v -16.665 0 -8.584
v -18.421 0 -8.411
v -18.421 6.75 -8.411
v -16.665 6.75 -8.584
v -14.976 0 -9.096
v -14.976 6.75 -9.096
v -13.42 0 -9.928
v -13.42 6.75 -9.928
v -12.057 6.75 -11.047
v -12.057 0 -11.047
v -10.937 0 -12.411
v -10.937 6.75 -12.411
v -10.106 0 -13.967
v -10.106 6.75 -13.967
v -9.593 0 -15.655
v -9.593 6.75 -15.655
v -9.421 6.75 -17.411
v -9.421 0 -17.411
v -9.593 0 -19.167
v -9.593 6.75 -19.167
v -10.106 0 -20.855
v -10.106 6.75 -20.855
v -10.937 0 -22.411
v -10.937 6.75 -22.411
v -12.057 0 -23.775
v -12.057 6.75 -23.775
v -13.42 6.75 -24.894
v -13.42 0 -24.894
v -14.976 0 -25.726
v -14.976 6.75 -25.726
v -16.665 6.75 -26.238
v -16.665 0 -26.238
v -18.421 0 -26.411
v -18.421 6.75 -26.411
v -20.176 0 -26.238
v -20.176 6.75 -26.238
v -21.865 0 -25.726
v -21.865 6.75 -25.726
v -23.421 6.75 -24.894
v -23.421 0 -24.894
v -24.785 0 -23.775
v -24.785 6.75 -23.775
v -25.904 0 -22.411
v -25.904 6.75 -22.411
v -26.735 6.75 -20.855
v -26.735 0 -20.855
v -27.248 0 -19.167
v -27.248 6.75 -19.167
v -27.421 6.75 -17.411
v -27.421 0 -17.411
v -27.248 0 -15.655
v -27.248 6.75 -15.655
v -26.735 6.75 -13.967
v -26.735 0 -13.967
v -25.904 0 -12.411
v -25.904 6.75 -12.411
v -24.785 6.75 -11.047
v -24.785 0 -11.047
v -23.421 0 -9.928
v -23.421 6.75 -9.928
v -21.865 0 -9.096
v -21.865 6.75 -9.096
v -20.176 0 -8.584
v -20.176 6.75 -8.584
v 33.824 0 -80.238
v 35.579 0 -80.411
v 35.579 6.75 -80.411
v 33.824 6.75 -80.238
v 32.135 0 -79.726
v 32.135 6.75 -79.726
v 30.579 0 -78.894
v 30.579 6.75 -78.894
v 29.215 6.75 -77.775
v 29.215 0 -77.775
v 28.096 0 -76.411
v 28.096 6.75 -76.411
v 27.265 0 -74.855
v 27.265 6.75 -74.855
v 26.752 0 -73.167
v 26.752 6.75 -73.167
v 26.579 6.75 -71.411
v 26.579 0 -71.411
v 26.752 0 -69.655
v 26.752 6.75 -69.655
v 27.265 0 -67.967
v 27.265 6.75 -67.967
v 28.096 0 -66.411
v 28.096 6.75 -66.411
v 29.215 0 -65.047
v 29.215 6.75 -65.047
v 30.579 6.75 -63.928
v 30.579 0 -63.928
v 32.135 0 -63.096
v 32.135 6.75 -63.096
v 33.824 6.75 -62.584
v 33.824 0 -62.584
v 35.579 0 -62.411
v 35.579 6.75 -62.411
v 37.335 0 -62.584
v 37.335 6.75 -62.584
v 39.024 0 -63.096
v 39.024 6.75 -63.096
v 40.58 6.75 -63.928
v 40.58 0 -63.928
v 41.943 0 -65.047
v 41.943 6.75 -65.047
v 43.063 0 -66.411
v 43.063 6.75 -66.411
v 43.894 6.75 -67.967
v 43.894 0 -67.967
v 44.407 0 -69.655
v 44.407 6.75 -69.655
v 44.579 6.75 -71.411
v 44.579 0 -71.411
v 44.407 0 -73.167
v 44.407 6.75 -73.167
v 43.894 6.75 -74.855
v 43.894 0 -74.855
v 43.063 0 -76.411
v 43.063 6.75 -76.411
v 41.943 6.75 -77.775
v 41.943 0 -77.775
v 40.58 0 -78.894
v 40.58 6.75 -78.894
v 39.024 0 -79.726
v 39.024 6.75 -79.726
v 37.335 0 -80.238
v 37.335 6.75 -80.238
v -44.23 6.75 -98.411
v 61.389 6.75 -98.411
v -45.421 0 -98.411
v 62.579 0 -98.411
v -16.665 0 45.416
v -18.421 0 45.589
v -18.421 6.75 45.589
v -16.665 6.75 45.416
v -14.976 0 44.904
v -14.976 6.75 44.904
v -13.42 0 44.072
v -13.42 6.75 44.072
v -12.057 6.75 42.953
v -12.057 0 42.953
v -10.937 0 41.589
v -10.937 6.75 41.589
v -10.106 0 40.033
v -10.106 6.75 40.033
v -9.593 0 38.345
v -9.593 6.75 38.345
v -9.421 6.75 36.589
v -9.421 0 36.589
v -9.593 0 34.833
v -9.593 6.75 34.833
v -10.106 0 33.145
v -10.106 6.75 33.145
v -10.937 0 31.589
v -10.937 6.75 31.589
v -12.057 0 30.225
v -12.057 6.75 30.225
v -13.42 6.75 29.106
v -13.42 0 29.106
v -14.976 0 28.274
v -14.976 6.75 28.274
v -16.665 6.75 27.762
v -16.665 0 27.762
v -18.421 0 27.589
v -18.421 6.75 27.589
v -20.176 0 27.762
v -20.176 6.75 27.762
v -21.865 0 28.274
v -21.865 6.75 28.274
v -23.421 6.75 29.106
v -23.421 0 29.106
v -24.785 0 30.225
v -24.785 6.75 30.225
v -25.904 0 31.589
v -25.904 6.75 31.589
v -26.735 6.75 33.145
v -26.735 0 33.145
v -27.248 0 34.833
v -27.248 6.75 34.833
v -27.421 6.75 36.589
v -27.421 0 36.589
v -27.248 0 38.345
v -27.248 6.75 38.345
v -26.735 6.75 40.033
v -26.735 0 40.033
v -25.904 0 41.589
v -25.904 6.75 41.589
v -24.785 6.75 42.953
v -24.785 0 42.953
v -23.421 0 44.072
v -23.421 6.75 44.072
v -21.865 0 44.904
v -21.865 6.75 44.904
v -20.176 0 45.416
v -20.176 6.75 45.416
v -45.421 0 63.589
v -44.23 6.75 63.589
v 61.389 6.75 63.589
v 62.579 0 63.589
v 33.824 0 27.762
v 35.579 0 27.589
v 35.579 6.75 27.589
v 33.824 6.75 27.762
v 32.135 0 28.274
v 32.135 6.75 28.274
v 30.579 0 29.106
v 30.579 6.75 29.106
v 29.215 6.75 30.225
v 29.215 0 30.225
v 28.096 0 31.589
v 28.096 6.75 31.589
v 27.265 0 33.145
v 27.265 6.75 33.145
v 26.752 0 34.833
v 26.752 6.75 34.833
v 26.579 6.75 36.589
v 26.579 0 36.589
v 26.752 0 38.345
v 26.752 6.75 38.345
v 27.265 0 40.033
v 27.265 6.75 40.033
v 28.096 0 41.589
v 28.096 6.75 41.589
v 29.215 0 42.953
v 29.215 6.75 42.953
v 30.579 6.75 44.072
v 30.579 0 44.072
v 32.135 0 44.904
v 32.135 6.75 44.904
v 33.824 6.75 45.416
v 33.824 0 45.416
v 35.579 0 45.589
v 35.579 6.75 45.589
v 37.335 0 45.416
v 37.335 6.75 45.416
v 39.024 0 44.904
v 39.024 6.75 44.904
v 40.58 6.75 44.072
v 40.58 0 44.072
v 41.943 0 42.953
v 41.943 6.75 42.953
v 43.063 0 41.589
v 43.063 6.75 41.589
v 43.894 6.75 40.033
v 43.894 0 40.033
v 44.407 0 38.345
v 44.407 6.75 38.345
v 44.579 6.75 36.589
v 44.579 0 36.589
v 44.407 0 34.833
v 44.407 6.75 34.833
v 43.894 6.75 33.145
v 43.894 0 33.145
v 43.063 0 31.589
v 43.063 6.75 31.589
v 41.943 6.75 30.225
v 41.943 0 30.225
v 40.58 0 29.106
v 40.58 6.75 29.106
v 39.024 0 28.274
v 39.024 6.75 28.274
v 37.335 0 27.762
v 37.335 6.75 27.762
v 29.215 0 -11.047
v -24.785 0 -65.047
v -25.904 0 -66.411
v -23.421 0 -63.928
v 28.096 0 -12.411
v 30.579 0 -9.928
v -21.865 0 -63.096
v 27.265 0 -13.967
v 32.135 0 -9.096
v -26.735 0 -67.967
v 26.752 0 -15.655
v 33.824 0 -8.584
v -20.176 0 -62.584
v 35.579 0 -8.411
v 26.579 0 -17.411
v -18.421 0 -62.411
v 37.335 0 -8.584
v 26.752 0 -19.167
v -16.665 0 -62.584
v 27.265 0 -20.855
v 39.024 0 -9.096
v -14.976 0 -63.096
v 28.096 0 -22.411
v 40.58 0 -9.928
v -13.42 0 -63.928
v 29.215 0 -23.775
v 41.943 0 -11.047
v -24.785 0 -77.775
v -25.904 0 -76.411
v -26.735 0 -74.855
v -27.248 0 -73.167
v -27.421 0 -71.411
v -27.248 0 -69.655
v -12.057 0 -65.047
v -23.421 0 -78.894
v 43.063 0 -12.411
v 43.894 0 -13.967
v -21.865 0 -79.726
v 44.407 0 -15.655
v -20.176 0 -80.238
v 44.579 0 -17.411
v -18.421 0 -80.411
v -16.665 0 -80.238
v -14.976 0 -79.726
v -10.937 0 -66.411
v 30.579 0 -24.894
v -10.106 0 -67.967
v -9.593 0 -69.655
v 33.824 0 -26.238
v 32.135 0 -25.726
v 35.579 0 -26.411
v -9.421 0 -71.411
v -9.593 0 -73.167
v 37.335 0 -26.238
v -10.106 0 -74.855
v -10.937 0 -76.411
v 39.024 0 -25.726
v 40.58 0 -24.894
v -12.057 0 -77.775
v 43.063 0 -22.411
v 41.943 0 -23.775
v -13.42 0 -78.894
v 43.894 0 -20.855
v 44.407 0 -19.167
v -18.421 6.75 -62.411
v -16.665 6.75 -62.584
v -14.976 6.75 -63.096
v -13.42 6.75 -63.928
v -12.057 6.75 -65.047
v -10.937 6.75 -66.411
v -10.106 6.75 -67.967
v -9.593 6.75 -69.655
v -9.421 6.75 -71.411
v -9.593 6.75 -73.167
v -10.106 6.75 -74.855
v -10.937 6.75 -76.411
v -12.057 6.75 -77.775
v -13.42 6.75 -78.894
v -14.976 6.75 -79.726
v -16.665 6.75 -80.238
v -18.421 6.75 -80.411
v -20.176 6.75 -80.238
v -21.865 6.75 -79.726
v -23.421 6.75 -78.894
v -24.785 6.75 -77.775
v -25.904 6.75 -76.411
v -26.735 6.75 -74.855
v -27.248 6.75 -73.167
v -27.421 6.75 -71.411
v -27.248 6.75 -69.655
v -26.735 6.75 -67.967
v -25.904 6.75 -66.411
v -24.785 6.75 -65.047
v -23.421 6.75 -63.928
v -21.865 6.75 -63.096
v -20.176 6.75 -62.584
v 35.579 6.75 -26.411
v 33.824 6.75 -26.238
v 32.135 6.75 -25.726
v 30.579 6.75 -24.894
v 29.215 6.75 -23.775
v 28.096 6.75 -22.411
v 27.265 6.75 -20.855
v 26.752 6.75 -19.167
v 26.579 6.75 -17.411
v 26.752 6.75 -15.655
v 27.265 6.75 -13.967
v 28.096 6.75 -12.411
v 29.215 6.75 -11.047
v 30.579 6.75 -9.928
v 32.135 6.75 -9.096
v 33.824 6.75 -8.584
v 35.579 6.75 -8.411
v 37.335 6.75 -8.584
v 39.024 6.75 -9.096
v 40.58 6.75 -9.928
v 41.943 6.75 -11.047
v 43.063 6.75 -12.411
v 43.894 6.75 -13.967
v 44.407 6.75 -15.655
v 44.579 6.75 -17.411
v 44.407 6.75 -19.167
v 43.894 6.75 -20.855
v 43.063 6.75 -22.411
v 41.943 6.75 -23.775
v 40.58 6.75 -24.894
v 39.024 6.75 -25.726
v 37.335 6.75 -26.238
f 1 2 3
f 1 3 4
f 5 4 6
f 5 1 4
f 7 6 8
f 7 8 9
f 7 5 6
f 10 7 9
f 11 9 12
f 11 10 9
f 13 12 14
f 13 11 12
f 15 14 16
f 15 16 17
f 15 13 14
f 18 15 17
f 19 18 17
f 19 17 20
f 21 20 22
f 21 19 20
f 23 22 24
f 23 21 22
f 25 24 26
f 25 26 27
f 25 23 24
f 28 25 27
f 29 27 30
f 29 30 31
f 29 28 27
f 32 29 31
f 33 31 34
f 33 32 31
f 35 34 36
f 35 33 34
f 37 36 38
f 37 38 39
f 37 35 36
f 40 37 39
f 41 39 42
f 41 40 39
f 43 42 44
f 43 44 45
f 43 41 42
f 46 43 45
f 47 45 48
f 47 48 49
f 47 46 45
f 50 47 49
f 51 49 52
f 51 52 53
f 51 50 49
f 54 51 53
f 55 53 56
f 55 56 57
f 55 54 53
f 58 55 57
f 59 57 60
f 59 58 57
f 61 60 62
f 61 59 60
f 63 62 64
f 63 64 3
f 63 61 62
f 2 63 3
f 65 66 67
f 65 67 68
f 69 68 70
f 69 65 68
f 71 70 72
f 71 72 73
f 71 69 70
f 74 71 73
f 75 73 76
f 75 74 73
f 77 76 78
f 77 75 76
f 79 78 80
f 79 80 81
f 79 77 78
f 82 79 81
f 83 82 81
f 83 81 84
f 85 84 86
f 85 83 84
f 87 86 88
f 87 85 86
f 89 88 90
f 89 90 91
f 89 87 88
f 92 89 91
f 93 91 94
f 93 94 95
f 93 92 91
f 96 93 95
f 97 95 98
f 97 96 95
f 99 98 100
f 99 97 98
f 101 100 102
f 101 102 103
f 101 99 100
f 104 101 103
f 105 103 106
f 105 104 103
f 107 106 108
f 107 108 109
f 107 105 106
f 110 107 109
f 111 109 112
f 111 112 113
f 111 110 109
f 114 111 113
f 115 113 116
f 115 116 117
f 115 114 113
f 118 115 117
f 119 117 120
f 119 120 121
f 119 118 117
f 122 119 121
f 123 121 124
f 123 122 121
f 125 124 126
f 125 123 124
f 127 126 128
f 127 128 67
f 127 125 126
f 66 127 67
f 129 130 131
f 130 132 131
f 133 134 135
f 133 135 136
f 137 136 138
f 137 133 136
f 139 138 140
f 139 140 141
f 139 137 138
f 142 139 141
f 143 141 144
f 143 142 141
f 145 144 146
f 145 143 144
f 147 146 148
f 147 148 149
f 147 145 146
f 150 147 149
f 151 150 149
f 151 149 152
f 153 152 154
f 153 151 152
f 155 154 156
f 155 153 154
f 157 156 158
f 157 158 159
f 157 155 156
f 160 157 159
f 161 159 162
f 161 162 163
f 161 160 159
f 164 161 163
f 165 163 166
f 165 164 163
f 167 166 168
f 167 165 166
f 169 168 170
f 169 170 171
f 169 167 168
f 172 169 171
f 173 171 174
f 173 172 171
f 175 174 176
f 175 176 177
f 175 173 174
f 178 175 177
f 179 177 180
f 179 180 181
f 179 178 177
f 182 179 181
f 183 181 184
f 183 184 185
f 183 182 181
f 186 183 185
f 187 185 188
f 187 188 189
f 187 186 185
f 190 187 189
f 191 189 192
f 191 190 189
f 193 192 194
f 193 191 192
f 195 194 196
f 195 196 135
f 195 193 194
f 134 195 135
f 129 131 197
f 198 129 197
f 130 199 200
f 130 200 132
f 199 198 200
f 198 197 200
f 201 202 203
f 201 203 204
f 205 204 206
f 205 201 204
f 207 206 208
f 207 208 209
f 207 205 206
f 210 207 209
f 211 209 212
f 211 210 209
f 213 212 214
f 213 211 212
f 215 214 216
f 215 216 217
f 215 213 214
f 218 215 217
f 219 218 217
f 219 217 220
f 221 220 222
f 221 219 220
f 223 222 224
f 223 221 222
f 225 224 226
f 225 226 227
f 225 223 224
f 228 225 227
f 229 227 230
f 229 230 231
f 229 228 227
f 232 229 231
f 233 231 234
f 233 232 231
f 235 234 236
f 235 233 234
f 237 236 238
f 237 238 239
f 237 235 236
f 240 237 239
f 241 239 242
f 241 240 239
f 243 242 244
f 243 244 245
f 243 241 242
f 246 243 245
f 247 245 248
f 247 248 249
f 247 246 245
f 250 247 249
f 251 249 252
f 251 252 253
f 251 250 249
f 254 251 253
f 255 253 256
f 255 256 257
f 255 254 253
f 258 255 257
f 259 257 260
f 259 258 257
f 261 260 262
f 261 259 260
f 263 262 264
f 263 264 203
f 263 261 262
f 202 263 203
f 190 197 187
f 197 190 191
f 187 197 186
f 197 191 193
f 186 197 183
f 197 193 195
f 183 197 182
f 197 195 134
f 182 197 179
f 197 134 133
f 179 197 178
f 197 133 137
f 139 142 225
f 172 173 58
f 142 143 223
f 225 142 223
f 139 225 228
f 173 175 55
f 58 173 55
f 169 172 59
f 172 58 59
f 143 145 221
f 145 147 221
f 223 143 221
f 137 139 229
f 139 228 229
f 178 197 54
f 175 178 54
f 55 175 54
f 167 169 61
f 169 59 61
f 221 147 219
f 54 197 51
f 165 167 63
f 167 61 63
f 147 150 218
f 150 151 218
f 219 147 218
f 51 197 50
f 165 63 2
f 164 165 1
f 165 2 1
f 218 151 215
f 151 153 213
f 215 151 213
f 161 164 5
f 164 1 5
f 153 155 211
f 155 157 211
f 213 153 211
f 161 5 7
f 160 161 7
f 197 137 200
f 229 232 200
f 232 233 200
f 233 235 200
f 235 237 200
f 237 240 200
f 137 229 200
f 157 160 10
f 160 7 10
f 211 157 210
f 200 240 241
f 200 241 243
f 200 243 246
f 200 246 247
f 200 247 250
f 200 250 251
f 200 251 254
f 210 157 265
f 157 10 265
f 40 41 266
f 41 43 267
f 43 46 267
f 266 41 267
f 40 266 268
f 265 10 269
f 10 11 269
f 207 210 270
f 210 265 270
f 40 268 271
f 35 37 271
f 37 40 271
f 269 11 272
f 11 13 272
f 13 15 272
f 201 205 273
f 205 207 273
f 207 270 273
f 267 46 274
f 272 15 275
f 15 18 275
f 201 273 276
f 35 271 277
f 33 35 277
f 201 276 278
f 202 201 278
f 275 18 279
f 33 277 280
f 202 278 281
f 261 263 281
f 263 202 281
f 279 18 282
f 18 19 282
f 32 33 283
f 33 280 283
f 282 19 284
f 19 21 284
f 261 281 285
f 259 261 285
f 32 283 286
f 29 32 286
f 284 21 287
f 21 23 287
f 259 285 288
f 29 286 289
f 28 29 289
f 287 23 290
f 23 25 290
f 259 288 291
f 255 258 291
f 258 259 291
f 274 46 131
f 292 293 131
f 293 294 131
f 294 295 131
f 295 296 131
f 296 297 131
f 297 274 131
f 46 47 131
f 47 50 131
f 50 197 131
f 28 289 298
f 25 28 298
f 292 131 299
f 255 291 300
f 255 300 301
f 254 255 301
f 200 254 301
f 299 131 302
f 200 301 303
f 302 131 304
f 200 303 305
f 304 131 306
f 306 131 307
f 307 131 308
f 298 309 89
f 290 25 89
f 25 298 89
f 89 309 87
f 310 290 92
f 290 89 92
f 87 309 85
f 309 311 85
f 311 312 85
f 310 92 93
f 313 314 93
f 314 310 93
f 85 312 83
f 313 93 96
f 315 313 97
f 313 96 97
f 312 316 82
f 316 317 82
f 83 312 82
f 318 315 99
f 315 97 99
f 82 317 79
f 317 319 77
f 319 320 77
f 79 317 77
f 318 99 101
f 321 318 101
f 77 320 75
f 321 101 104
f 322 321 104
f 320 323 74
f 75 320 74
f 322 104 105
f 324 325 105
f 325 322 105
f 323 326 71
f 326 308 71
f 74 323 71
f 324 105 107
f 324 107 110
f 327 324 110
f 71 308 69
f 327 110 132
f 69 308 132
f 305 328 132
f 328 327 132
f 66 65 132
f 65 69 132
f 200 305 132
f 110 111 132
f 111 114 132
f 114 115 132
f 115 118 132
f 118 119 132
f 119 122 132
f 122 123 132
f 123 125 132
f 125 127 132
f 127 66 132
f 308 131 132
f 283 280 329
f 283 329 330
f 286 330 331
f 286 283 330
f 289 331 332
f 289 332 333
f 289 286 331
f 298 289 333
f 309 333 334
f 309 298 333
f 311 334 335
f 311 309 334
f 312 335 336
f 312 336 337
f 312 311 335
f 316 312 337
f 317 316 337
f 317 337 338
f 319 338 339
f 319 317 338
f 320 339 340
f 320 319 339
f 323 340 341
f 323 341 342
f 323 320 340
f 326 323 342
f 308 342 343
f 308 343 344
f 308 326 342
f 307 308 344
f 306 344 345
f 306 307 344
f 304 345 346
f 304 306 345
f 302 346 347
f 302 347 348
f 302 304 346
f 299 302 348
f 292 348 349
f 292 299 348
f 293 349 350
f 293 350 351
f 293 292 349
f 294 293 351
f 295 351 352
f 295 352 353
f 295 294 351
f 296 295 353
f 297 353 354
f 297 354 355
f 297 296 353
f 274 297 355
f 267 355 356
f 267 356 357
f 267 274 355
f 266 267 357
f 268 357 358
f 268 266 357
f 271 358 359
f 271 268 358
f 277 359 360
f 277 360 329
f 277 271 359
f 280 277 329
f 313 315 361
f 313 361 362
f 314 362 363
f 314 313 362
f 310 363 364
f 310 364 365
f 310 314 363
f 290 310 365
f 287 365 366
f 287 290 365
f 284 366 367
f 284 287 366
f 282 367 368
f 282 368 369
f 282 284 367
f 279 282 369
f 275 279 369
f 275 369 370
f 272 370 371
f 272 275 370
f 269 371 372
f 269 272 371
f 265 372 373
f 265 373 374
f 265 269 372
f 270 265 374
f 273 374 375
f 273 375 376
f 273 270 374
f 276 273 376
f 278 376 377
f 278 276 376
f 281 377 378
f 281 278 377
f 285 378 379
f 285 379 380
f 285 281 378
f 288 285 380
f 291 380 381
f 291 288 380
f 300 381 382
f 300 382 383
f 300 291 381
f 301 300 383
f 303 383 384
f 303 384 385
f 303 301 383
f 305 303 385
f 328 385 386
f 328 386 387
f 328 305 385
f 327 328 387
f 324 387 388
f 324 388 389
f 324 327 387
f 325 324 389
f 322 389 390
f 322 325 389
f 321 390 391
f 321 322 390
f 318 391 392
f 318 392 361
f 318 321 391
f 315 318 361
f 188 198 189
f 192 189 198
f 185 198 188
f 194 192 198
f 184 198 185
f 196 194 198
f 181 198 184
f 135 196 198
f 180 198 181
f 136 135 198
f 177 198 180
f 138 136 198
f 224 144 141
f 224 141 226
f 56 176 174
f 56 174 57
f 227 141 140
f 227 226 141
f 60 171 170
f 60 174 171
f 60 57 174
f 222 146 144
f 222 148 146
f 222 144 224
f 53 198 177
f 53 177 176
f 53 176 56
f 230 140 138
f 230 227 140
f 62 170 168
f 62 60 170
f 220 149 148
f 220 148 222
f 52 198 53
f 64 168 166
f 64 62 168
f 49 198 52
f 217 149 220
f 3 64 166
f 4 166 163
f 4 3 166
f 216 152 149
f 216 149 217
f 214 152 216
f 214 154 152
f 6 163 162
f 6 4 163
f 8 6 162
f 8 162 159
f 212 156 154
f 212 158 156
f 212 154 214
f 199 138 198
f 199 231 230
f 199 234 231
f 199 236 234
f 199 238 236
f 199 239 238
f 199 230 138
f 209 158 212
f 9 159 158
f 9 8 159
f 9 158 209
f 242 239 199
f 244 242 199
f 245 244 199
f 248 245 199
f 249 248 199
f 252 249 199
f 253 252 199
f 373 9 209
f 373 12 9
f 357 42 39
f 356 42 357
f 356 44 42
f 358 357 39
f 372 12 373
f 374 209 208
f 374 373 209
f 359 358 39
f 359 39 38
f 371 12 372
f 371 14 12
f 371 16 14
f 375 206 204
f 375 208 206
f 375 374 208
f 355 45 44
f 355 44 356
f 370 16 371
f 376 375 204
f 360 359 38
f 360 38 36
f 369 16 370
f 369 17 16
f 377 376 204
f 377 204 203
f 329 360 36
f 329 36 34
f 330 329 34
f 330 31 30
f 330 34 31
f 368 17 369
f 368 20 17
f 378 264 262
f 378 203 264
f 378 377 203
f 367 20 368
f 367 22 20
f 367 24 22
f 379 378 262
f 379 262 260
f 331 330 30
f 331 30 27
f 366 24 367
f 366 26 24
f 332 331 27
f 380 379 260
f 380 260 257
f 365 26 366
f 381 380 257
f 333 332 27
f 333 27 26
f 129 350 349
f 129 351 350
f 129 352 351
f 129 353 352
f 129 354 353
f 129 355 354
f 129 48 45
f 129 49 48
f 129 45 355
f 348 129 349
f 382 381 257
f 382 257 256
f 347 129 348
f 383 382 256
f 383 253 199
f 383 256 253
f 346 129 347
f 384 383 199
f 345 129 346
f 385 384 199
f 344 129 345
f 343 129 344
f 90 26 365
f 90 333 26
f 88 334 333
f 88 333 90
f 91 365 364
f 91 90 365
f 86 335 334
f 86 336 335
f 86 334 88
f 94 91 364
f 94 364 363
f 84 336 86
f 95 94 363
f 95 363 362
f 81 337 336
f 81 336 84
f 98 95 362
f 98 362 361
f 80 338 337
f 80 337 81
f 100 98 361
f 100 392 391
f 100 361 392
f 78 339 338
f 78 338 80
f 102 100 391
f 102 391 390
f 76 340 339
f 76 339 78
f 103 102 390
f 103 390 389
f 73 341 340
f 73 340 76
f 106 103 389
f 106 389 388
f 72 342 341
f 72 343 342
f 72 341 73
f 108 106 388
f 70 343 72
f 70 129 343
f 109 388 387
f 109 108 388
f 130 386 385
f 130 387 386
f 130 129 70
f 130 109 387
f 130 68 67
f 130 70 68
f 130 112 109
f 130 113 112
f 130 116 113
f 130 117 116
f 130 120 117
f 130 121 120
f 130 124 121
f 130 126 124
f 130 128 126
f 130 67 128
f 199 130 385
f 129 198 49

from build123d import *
from OCP.BRepFilletAPI import BRepFilletAPI_MakeChamfer

# Parameters (mm, degrees)
SKETCH1_R           = 9
BOSS_EXTRUDE1_DEPTH = 6.75
CHAMFER1_SIZE       = 6.75
CHAMFER1_SIZE_2     = 1.19020712


with BuildPart() as part:
    # Sketch1 → Boss-Extrude1 (new body)
    with BuildSketch(Plane(origin=(0, 0, 0), x_dir=(1, 0, 0), z_dir=(0, 1, 0))):
        Polygon((-45.420560748, -63.588785047), (-18.420560748, -63.588785047), (62.579439252, -63.588785047), (62.579439252, 98.411214953), (-45.420560748, 98.411214953), (-45.420560748, -36.588785047), align=None)
        with Locations(Location((-18.420560748, -36.588785047, 0), (0, 0, 270))):
            Circle(SKETCH1_R, mode=Mode.SUBTRACT)
        with Locations(Location((35.579439252, 71.411214953, 0), (0, 0, 90))):
            Circle(SKETCH1_R, mode=Mode.SUBTRACT)
        with Locations(Location((35.579439252, 17.411214953, 0), (0, 0, 90))):
            Circle(SKETCH1_R, mode=Mode.SUBTRACT)
        with Locations(Location((-18.420560748, 17.411214953, 0), (0, 0, 270))):
            Circle(SKETCH1_R, mode=Mode.SUBTRACT)
        with Locations(Location((-18.420560748, 71.411214953, 0), (0, 0, 270))):
            Circle(SKETCH1_R, mode=Mode.SUBTRACT)
        with Locations(Location((35.579439252, -36.588785047, 0), (0, 0, 90))):
            Circle(SKETCH1_R, mode=Mode.SUBTRACT)
    extrude(amount=BOSS_EXTRUDE1_DEPTH)

    # Chamfer1
    chamfer1_edges_1 = [part.edges().sort_by_distance(p)[0] for p in [
        (62.579439252, 6.75, -17.411214953),
    ]]
    chamfer1_side_1 = [part.faces().sort_by_distance(p)[0] for p in [
        (62.579439252, 6.726195858, -17.411214953),
    ]]
    chamfer1_edges_2 = [part.edges().sort_by_distance(p)[0] for p in [
        (-45.420560748, 6.75, -17.411214953),
    ]]
    chamfer1_side_2 = [part.faces().sort_by_distance(p)[0] for p in [
        (-45.396756605, 6.75, -17.411214953),
    ]]
    chamfer1 = BRepFilletAPI_MakeChamfer(part.part.solid().wrapped)
    for e in chamfer1_edges_1:
        chamfer1.Add(CHAMFER1_SIZE - 0.0001, CHAMFER1_SIZE_2 - 0.0001, e.wrapped, chamfer1_side_1[0].wrapped)
    for e in chamfer1_edges_2:
        chamfer1.Add(CHAMFER1_SIZE_2 - 0.0001, CHAMFER1_SIZE - 0.0001, e.wrapped, chamfer1_side_2[0].wrapped)
    add(Compound.cast(chamfer1.Shape()), mode=Mode.REPLACE)  # a hair under: the kernel refuses the full size


solid = part.part
